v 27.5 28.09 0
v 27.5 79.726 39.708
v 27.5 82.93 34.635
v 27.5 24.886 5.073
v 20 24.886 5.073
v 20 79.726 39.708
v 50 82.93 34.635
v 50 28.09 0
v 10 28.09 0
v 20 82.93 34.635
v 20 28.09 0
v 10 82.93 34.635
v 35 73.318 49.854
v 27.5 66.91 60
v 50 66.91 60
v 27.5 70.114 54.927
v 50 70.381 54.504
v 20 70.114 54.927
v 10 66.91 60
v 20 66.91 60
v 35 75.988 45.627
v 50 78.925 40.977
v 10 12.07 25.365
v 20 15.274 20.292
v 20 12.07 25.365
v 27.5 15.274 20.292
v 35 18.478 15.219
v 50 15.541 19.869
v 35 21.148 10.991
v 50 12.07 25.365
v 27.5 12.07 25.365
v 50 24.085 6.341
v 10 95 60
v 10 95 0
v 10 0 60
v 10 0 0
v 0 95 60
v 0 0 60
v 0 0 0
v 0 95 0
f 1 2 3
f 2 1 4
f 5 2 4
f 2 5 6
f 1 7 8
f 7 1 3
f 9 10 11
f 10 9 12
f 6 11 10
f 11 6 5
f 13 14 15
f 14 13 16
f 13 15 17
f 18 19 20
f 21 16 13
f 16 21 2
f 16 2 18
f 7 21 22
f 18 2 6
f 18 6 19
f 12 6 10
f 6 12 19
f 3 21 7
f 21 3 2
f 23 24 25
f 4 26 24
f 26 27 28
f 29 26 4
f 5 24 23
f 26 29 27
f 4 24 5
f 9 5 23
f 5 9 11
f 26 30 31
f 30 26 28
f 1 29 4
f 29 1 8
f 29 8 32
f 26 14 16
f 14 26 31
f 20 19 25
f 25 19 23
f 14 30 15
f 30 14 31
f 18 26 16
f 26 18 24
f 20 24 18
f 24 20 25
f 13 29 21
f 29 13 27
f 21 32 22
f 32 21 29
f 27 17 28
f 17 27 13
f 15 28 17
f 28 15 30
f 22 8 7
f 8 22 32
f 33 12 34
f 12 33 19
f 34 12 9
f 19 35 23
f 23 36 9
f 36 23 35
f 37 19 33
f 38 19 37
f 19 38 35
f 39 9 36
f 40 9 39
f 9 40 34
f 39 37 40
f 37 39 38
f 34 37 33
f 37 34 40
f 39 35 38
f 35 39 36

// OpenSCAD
// file: Library_2021.scad
$fn = 100;//This number should normally be around or at 100.


//===========================================================================================================================
//===========================================================================================================================
module sqaure_torus(outerXlength, outerYlength, innerXlength, innerYlength, obritalDis, angleHere){//Sqaure torus
rotate_extrude(angle = angleHere,convexity = 10){
translate([obritalDis + outerXlength / 2, outerYlength / 2, 0])
    difference(){
        square([outerXlength, outerYlength], center = true);
        square([innerXlength, innerYlength], center = true);
        
        }
    }
}
//===========================================================================================================================
//===========================================================================================================================
module torus(outerRadius, innerRadius, orbitalDistance, angleHere){// Donut shape
    rotate_extrude(angle= angleHere, convexity= 10){
        translate([orbitalDistance, 0, 0])
            difference(){
                circle(outerRadius);
                circle(innerRadius);
                }
        }
    assert(angleHere <= 360, "angle is greater than 360!");
    assert(outerRadius > innerRadius, "Inner circle is greater than outer circle!");
    assert(orbitalDistance > 0, "orbital radius is less than zero!");
    }
//===========================================================================================================================
//===========================================================================================================================
module orbital_cylinders(OrbitalRadius, NumberOfCylinders, cylinderRadius, Height, Xtilt, Ytilt){// cuts circles in a circle
    for (Hole = [0:NumberOfCylinders]){
        rotate([0, 0, 360/NumberOfCylinders])
        translate([OrbitalRadius, 0, 0])
        rotate([Xtilt, Ytilt,0])
            cylinder(Height, r= cylinderRadius);
        }
    }
//===========================================================================================================================
//===========================================================================================================================
module annulus(OuterRadius, InnerRadius, Height){//Pipe shape
    differnce(){
        //Prime object
        cylinder(Height, r= OuterRadius);
        //Cutting object(s)
        cylinder(Height, r= InnerRadius);
        }
    }
//==========================================================================================================================
//==========================================================================================================================
module ceinture(OuterRadius, InnerRadius, Height, BetweenCenters){// Belt shape
    difference(){
        hull(){//Prime object
            cylinder(Height, r= outerRadius);
            translate([BetweenCenters, 0, 0])
                cylinder(Height, r= outerRadius);
            }
        hull(){//Cutting object
            cylinder(Height, r= InnerRadius);
            translate([BetweenCenters, 0, 0])
                cylinder(Height, r= InnerRadius);
            }
        }
    }
//==========================================================================================================================
//==========================================================================================================================
module triangle(type, leg_a, leg_b,hypotenuse){// draws right, scalene, isosceles and equilateral triangles
    if(type == "right"){
        polygon( points = [[0, 0],[leg_a, 0],[0, leg_b]]);
            }
        else if(type == "scalene"){
            hypotenuse = sqrt(pow(leg_a, 2) + pow(leg_b, 2));
                polygon(points = [[0,-(leg_a/2)],[leg_b,0],[0,hypotenuse]]);
            }
        else if(type == "isosceles"){
                polygon(points = [[0,-(leg_a/2)],[leg_b,0],[0,(leg_a/2)]]);
            }
        else if(type == "equilateral"){
                polygon(points = [[0,-(leg_a/2)],[leg_a,0],[0,leg_a]]);
            }
    }
//==========================================================================================================================
//==========================================================================================================================
module _name_(){}
//==========================================================================================================================
//==========================================================================================================================
module _name_(){}
//==========================================================================================================================
//==========================================================================================================================
module _name_(){}
//==========================================================================================================================
//==========================================================================================================================
// main file
$fn = 100;
mm = 1;
in = 25.4 * mm;
u = 1;
degree = 1;
diameter = .5;
p1=$preview?1+1/$fn:1;
use <Library_2021.scad>

Part_152();

module Part_152(){
    
    Plate();
    
    //Plate Values
        PlateLength = 95;
        PlateWidth = 60;
        PlateDepth = 10;
    
    module Plate(){cube([PlateDepth, PlateLength, PlateWidth]);}

    // Shape location values
    Yoffset = 28.09;
    //#translate([ 0, PlateLength - Yoffset, PlateWidth])cube([40, Yoffset, 1]);
    
    translate([PlateDepth, Yoffset, 0])rotate([32.2755, 0, 0])Shape();
    
    module Shape(){
        
        cubeBaseX = 40;
        cubeBaseY = 64.8615;
        cubeBaseZ = 30;
        
        difference(){
            cube([cubeBaseX, cubeBaseY, cubeBaseZ]);
                Cuts();
            }
        
        module Cuts(){
            notchOffsetX = 10;

            notchCutWidth = 7.5;
            notchCutDepth = 6;            
            
            trapHeightbase = 16;
            trapHeighttop = 5;
            
            trapDepth = 15;
            trapZoffset = 7.5;
            
            core = ($fn/$fn);
            notsurewhattocallthis = (core / 2);
            
            #translate([notchOffsetX, 0, 0])notch();//Bottom Cut
            #translate([notchOffsetX, 0, cubeBaseZ - notchCutDepth])notch();//Top Cut
            #translate([cubeBaseX - trapDepth,0,trapZoffset])trap();
            
            module notch(){cube([notchCutWidth, cubeBaseY, notchCutDepth]);}
            module trap(){
                translate([trapDepth + core, cubeBaseY / 2, trapHeightbase / 2])
                    rotate([0, 180, 0])
                        hull(){
                            translate([notsurewhattocallthis, 0, 0])cube([$fn/$fn, cubeBaseY, trapHeightbase], true);
                            translate([notsurewhattocallthis + trapDepth, 0, 0])cube([$fn/$fn, cubeBaseY, trapHeighttop], true);
                            
                            }
                }
            }
        }
    }
